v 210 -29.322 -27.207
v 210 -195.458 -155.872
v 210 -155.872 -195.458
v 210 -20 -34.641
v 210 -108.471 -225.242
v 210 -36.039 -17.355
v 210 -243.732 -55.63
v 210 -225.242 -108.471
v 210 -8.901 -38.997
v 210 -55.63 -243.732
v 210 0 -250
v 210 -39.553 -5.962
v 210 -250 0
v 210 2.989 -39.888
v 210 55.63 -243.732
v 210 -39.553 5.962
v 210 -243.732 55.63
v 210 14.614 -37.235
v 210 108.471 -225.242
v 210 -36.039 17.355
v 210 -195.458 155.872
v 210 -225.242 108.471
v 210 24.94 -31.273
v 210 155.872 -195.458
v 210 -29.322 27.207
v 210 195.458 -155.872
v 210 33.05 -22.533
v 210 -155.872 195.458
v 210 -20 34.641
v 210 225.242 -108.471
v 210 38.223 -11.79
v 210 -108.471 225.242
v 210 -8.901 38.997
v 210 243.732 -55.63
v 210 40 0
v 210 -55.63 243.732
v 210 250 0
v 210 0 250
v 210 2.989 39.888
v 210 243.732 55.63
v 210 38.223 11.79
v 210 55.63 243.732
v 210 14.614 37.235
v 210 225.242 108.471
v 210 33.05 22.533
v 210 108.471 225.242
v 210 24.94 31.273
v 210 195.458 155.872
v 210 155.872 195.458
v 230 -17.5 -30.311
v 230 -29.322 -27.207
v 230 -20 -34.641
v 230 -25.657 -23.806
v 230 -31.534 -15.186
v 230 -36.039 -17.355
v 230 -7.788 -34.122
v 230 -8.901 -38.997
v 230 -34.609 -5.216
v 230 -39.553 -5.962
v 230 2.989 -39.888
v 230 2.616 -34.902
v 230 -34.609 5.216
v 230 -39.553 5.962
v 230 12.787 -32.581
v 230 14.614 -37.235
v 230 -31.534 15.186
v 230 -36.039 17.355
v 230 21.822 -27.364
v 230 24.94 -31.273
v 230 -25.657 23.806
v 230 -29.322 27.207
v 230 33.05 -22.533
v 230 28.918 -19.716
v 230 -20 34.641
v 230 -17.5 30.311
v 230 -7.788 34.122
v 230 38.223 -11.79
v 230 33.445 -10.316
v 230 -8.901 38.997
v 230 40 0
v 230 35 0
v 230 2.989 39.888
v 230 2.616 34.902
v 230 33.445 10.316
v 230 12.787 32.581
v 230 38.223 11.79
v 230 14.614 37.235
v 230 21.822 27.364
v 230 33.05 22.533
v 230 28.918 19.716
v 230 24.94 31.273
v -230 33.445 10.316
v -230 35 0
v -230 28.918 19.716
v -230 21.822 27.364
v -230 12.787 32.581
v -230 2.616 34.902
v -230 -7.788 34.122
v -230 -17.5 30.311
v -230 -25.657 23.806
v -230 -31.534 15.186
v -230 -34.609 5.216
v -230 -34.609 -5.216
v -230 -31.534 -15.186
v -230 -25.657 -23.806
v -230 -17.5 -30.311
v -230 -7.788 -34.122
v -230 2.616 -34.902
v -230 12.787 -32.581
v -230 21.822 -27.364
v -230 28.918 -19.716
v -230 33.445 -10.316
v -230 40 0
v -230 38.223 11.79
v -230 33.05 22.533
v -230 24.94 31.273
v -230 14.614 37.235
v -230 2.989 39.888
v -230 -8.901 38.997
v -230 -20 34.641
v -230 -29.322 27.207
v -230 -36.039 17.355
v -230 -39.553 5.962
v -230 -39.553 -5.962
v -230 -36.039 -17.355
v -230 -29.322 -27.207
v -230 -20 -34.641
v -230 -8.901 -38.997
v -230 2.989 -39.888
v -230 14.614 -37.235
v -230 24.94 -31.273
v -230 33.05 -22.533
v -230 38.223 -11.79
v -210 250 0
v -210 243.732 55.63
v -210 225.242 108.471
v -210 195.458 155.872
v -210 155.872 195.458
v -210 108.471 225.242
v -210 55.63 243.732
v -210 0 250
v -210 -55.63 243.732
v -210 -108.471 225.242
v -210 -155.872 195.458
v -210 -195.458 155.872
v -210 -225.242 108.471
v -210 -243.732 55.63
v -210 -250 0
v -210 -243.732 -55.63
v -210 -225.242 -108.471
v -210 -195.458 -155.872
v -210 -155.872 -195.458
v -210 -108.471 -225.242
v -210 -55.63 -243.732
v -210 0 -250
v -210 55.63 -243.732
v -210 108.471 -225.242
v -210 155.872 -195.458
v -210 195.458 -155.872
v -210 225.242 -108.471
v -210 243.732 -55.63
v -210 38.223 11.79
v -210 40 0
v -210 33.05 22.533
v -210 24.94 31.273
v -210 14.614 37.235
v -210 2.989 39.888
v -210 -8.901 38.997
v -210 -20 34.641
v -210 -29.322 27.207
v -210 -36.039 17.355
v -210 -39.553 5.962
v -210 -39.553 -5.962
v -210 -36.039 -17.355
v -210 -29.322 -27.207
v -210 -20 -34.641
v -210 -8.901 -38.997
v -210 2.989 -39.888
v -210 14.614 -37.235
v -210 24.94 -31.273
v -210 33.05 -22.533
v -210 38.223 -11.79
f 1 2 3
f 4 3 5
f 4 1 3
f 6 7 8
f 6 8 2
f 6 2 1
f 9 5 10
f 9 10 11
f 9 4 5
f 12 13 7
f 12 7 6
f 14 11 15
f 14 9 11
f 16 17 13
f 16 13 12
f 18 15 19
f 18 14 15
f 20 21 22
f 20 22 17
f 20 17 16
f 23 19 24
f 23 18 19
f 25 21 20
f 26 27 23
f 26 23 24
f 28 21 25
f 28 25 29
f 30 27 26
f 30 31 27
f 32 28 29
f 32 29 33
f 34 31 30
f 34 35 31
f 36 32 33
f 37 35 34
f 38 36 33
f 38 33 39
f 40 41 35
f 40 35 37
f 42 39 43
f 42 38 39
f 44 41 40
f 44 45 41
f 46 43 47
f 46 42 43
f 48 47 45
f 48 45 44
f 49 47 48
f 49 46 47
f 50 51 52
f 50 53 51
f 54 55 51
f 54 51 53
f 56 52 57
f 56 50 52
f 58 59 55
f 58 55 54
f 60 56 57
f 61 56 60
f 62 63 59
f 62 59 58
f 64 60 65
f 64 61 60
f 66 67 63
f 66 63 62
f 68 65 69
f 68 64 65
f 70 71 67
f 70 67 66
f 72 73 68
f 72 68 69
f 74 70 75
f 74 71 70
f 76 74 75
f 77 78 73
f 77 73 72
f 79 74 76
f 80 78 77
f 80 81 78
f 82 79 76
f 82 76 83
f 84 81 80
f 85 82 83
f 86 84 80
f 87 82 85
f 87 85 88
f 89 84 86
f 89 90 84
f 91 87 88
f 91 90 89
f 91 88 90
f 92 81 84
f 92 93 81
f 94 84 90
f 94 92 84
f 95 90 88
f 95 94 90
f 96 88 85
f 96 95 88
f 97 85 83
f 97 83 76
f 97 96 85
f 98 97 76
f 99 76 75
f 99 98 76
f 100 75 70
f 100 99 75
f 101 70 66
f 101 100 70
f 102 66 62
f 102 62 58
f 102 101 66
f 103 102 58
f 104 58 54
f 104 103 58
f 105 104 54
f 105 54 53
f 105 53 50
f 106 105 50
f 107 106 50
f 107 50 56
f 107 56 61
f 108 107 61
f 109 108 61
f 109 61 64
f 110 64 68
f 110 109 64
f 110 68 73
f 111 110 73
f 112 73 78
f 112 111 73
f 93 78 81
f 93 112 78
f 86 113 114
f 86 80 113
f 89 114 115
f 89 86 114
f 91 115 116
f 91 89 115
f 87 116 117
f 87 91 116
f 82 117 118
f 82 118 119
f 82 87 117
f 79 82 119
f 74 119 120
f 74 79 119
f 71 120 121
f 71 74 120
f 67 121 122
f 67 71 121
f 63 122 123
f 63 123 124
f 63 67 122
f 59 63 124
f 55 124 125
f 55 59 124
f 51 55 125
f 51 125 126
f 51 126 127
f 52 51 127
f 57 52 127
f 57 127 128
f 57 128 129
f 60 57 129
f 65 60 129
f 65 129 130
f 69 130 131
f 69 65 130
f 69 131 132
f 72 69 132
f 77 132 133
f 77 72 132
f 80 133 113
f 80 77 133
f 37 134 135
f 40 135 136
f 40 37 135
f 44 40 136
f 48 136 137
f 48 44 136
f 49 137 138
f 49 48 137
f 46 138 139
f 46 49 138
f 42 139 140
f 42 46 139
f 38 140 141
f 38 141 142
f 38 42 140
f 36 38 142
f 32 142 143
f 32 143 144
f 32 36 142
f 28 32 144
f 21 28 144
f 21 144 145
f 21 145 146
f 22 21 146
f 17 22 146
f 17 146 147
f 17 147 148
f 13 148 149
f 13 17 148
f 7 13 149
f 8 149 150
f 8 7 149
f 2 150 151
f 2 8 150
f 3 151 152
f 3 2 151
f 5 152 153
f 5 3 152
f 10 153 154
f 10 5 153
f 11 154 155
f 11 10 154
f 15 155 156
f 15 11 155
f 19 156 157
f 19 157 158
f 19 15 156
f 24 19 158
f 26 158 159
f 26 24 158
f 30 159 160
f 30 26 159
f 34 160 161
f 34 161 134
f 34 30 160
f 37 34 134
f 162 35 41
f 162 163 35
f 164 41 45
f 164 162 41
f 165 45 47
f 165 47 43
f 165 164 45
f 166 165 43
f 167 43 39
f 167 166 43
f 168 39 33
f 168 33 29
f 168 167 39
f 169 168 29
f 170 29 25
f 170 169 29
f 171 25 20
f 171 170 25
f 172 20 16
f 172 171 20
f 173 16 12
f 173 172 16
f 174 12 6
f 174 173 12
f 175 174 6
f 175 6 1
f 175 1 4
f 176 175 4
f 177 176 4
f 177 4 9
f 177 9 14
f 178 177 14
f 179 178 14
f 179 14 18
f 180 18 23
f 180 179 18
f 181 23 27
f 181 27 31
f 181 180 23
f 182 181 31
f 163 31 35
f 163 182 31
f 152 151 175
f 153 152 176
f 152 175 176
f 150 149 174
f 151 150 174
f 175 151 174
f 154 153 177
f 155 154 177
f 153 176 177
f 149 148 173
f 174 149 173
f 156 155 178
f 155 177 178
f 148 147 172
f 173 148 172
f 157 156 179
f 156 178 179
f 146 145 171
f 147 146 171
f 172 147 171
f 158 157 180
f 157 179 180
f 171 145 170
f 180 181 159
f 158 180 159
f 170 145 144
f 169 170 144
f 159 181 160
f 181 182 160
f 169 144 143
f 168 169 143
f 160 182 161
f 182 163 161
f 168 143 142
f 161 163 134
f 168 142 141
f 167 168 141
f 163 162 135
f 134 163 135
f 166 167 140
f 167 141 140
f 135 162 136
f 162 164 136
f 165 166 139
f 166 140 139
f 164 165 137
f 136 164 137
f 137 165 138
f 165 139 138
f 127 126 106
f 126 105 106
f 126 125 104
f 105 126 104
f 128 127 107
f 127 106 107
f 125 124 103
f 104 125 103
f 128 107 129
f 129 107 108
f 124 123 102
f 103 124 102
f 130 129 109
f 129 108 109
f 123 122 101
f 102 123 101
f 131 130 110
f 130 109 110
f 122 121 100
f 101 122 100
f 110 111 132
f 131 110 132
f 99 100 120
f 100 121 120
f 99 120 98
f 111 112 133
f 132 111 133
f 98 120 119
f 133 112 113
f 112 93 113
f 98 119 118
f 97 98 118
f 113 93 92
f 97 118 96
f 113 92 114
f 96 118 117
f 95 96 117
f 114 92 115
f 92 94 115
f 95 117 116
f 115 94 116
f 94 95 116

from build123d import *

# Parameters (mm, degrees)
F0_R     = 40
F0_R_2   = 35
F1_DEPTH = 230
F2_R     = 250
F2_R_2   = 40
F3_DEPTH = 210


with BuildPart() as f1:
    # F0 (on Right) → F1 (new body, symmetric)
    with BuildSketch(Plane.YZ):
        Circle(F0_R)
        Circle(F0_R_2, mode=Mode.SUBTRACT)
    extrude(amount=F1_DEPTH, both=True)


with BuildPart() as f3:
    # F2 (on Right) → F3 (new body, symmetric)
    with BuildSketch(Plane.YZ):
        Circle(F2_R)
        Circle(F2_R_2, mode=Mode.SUBTRACT)
    extrude(amount=F3_DEPTH, both=True)


solid = Compound([f1.part, f3.part])
